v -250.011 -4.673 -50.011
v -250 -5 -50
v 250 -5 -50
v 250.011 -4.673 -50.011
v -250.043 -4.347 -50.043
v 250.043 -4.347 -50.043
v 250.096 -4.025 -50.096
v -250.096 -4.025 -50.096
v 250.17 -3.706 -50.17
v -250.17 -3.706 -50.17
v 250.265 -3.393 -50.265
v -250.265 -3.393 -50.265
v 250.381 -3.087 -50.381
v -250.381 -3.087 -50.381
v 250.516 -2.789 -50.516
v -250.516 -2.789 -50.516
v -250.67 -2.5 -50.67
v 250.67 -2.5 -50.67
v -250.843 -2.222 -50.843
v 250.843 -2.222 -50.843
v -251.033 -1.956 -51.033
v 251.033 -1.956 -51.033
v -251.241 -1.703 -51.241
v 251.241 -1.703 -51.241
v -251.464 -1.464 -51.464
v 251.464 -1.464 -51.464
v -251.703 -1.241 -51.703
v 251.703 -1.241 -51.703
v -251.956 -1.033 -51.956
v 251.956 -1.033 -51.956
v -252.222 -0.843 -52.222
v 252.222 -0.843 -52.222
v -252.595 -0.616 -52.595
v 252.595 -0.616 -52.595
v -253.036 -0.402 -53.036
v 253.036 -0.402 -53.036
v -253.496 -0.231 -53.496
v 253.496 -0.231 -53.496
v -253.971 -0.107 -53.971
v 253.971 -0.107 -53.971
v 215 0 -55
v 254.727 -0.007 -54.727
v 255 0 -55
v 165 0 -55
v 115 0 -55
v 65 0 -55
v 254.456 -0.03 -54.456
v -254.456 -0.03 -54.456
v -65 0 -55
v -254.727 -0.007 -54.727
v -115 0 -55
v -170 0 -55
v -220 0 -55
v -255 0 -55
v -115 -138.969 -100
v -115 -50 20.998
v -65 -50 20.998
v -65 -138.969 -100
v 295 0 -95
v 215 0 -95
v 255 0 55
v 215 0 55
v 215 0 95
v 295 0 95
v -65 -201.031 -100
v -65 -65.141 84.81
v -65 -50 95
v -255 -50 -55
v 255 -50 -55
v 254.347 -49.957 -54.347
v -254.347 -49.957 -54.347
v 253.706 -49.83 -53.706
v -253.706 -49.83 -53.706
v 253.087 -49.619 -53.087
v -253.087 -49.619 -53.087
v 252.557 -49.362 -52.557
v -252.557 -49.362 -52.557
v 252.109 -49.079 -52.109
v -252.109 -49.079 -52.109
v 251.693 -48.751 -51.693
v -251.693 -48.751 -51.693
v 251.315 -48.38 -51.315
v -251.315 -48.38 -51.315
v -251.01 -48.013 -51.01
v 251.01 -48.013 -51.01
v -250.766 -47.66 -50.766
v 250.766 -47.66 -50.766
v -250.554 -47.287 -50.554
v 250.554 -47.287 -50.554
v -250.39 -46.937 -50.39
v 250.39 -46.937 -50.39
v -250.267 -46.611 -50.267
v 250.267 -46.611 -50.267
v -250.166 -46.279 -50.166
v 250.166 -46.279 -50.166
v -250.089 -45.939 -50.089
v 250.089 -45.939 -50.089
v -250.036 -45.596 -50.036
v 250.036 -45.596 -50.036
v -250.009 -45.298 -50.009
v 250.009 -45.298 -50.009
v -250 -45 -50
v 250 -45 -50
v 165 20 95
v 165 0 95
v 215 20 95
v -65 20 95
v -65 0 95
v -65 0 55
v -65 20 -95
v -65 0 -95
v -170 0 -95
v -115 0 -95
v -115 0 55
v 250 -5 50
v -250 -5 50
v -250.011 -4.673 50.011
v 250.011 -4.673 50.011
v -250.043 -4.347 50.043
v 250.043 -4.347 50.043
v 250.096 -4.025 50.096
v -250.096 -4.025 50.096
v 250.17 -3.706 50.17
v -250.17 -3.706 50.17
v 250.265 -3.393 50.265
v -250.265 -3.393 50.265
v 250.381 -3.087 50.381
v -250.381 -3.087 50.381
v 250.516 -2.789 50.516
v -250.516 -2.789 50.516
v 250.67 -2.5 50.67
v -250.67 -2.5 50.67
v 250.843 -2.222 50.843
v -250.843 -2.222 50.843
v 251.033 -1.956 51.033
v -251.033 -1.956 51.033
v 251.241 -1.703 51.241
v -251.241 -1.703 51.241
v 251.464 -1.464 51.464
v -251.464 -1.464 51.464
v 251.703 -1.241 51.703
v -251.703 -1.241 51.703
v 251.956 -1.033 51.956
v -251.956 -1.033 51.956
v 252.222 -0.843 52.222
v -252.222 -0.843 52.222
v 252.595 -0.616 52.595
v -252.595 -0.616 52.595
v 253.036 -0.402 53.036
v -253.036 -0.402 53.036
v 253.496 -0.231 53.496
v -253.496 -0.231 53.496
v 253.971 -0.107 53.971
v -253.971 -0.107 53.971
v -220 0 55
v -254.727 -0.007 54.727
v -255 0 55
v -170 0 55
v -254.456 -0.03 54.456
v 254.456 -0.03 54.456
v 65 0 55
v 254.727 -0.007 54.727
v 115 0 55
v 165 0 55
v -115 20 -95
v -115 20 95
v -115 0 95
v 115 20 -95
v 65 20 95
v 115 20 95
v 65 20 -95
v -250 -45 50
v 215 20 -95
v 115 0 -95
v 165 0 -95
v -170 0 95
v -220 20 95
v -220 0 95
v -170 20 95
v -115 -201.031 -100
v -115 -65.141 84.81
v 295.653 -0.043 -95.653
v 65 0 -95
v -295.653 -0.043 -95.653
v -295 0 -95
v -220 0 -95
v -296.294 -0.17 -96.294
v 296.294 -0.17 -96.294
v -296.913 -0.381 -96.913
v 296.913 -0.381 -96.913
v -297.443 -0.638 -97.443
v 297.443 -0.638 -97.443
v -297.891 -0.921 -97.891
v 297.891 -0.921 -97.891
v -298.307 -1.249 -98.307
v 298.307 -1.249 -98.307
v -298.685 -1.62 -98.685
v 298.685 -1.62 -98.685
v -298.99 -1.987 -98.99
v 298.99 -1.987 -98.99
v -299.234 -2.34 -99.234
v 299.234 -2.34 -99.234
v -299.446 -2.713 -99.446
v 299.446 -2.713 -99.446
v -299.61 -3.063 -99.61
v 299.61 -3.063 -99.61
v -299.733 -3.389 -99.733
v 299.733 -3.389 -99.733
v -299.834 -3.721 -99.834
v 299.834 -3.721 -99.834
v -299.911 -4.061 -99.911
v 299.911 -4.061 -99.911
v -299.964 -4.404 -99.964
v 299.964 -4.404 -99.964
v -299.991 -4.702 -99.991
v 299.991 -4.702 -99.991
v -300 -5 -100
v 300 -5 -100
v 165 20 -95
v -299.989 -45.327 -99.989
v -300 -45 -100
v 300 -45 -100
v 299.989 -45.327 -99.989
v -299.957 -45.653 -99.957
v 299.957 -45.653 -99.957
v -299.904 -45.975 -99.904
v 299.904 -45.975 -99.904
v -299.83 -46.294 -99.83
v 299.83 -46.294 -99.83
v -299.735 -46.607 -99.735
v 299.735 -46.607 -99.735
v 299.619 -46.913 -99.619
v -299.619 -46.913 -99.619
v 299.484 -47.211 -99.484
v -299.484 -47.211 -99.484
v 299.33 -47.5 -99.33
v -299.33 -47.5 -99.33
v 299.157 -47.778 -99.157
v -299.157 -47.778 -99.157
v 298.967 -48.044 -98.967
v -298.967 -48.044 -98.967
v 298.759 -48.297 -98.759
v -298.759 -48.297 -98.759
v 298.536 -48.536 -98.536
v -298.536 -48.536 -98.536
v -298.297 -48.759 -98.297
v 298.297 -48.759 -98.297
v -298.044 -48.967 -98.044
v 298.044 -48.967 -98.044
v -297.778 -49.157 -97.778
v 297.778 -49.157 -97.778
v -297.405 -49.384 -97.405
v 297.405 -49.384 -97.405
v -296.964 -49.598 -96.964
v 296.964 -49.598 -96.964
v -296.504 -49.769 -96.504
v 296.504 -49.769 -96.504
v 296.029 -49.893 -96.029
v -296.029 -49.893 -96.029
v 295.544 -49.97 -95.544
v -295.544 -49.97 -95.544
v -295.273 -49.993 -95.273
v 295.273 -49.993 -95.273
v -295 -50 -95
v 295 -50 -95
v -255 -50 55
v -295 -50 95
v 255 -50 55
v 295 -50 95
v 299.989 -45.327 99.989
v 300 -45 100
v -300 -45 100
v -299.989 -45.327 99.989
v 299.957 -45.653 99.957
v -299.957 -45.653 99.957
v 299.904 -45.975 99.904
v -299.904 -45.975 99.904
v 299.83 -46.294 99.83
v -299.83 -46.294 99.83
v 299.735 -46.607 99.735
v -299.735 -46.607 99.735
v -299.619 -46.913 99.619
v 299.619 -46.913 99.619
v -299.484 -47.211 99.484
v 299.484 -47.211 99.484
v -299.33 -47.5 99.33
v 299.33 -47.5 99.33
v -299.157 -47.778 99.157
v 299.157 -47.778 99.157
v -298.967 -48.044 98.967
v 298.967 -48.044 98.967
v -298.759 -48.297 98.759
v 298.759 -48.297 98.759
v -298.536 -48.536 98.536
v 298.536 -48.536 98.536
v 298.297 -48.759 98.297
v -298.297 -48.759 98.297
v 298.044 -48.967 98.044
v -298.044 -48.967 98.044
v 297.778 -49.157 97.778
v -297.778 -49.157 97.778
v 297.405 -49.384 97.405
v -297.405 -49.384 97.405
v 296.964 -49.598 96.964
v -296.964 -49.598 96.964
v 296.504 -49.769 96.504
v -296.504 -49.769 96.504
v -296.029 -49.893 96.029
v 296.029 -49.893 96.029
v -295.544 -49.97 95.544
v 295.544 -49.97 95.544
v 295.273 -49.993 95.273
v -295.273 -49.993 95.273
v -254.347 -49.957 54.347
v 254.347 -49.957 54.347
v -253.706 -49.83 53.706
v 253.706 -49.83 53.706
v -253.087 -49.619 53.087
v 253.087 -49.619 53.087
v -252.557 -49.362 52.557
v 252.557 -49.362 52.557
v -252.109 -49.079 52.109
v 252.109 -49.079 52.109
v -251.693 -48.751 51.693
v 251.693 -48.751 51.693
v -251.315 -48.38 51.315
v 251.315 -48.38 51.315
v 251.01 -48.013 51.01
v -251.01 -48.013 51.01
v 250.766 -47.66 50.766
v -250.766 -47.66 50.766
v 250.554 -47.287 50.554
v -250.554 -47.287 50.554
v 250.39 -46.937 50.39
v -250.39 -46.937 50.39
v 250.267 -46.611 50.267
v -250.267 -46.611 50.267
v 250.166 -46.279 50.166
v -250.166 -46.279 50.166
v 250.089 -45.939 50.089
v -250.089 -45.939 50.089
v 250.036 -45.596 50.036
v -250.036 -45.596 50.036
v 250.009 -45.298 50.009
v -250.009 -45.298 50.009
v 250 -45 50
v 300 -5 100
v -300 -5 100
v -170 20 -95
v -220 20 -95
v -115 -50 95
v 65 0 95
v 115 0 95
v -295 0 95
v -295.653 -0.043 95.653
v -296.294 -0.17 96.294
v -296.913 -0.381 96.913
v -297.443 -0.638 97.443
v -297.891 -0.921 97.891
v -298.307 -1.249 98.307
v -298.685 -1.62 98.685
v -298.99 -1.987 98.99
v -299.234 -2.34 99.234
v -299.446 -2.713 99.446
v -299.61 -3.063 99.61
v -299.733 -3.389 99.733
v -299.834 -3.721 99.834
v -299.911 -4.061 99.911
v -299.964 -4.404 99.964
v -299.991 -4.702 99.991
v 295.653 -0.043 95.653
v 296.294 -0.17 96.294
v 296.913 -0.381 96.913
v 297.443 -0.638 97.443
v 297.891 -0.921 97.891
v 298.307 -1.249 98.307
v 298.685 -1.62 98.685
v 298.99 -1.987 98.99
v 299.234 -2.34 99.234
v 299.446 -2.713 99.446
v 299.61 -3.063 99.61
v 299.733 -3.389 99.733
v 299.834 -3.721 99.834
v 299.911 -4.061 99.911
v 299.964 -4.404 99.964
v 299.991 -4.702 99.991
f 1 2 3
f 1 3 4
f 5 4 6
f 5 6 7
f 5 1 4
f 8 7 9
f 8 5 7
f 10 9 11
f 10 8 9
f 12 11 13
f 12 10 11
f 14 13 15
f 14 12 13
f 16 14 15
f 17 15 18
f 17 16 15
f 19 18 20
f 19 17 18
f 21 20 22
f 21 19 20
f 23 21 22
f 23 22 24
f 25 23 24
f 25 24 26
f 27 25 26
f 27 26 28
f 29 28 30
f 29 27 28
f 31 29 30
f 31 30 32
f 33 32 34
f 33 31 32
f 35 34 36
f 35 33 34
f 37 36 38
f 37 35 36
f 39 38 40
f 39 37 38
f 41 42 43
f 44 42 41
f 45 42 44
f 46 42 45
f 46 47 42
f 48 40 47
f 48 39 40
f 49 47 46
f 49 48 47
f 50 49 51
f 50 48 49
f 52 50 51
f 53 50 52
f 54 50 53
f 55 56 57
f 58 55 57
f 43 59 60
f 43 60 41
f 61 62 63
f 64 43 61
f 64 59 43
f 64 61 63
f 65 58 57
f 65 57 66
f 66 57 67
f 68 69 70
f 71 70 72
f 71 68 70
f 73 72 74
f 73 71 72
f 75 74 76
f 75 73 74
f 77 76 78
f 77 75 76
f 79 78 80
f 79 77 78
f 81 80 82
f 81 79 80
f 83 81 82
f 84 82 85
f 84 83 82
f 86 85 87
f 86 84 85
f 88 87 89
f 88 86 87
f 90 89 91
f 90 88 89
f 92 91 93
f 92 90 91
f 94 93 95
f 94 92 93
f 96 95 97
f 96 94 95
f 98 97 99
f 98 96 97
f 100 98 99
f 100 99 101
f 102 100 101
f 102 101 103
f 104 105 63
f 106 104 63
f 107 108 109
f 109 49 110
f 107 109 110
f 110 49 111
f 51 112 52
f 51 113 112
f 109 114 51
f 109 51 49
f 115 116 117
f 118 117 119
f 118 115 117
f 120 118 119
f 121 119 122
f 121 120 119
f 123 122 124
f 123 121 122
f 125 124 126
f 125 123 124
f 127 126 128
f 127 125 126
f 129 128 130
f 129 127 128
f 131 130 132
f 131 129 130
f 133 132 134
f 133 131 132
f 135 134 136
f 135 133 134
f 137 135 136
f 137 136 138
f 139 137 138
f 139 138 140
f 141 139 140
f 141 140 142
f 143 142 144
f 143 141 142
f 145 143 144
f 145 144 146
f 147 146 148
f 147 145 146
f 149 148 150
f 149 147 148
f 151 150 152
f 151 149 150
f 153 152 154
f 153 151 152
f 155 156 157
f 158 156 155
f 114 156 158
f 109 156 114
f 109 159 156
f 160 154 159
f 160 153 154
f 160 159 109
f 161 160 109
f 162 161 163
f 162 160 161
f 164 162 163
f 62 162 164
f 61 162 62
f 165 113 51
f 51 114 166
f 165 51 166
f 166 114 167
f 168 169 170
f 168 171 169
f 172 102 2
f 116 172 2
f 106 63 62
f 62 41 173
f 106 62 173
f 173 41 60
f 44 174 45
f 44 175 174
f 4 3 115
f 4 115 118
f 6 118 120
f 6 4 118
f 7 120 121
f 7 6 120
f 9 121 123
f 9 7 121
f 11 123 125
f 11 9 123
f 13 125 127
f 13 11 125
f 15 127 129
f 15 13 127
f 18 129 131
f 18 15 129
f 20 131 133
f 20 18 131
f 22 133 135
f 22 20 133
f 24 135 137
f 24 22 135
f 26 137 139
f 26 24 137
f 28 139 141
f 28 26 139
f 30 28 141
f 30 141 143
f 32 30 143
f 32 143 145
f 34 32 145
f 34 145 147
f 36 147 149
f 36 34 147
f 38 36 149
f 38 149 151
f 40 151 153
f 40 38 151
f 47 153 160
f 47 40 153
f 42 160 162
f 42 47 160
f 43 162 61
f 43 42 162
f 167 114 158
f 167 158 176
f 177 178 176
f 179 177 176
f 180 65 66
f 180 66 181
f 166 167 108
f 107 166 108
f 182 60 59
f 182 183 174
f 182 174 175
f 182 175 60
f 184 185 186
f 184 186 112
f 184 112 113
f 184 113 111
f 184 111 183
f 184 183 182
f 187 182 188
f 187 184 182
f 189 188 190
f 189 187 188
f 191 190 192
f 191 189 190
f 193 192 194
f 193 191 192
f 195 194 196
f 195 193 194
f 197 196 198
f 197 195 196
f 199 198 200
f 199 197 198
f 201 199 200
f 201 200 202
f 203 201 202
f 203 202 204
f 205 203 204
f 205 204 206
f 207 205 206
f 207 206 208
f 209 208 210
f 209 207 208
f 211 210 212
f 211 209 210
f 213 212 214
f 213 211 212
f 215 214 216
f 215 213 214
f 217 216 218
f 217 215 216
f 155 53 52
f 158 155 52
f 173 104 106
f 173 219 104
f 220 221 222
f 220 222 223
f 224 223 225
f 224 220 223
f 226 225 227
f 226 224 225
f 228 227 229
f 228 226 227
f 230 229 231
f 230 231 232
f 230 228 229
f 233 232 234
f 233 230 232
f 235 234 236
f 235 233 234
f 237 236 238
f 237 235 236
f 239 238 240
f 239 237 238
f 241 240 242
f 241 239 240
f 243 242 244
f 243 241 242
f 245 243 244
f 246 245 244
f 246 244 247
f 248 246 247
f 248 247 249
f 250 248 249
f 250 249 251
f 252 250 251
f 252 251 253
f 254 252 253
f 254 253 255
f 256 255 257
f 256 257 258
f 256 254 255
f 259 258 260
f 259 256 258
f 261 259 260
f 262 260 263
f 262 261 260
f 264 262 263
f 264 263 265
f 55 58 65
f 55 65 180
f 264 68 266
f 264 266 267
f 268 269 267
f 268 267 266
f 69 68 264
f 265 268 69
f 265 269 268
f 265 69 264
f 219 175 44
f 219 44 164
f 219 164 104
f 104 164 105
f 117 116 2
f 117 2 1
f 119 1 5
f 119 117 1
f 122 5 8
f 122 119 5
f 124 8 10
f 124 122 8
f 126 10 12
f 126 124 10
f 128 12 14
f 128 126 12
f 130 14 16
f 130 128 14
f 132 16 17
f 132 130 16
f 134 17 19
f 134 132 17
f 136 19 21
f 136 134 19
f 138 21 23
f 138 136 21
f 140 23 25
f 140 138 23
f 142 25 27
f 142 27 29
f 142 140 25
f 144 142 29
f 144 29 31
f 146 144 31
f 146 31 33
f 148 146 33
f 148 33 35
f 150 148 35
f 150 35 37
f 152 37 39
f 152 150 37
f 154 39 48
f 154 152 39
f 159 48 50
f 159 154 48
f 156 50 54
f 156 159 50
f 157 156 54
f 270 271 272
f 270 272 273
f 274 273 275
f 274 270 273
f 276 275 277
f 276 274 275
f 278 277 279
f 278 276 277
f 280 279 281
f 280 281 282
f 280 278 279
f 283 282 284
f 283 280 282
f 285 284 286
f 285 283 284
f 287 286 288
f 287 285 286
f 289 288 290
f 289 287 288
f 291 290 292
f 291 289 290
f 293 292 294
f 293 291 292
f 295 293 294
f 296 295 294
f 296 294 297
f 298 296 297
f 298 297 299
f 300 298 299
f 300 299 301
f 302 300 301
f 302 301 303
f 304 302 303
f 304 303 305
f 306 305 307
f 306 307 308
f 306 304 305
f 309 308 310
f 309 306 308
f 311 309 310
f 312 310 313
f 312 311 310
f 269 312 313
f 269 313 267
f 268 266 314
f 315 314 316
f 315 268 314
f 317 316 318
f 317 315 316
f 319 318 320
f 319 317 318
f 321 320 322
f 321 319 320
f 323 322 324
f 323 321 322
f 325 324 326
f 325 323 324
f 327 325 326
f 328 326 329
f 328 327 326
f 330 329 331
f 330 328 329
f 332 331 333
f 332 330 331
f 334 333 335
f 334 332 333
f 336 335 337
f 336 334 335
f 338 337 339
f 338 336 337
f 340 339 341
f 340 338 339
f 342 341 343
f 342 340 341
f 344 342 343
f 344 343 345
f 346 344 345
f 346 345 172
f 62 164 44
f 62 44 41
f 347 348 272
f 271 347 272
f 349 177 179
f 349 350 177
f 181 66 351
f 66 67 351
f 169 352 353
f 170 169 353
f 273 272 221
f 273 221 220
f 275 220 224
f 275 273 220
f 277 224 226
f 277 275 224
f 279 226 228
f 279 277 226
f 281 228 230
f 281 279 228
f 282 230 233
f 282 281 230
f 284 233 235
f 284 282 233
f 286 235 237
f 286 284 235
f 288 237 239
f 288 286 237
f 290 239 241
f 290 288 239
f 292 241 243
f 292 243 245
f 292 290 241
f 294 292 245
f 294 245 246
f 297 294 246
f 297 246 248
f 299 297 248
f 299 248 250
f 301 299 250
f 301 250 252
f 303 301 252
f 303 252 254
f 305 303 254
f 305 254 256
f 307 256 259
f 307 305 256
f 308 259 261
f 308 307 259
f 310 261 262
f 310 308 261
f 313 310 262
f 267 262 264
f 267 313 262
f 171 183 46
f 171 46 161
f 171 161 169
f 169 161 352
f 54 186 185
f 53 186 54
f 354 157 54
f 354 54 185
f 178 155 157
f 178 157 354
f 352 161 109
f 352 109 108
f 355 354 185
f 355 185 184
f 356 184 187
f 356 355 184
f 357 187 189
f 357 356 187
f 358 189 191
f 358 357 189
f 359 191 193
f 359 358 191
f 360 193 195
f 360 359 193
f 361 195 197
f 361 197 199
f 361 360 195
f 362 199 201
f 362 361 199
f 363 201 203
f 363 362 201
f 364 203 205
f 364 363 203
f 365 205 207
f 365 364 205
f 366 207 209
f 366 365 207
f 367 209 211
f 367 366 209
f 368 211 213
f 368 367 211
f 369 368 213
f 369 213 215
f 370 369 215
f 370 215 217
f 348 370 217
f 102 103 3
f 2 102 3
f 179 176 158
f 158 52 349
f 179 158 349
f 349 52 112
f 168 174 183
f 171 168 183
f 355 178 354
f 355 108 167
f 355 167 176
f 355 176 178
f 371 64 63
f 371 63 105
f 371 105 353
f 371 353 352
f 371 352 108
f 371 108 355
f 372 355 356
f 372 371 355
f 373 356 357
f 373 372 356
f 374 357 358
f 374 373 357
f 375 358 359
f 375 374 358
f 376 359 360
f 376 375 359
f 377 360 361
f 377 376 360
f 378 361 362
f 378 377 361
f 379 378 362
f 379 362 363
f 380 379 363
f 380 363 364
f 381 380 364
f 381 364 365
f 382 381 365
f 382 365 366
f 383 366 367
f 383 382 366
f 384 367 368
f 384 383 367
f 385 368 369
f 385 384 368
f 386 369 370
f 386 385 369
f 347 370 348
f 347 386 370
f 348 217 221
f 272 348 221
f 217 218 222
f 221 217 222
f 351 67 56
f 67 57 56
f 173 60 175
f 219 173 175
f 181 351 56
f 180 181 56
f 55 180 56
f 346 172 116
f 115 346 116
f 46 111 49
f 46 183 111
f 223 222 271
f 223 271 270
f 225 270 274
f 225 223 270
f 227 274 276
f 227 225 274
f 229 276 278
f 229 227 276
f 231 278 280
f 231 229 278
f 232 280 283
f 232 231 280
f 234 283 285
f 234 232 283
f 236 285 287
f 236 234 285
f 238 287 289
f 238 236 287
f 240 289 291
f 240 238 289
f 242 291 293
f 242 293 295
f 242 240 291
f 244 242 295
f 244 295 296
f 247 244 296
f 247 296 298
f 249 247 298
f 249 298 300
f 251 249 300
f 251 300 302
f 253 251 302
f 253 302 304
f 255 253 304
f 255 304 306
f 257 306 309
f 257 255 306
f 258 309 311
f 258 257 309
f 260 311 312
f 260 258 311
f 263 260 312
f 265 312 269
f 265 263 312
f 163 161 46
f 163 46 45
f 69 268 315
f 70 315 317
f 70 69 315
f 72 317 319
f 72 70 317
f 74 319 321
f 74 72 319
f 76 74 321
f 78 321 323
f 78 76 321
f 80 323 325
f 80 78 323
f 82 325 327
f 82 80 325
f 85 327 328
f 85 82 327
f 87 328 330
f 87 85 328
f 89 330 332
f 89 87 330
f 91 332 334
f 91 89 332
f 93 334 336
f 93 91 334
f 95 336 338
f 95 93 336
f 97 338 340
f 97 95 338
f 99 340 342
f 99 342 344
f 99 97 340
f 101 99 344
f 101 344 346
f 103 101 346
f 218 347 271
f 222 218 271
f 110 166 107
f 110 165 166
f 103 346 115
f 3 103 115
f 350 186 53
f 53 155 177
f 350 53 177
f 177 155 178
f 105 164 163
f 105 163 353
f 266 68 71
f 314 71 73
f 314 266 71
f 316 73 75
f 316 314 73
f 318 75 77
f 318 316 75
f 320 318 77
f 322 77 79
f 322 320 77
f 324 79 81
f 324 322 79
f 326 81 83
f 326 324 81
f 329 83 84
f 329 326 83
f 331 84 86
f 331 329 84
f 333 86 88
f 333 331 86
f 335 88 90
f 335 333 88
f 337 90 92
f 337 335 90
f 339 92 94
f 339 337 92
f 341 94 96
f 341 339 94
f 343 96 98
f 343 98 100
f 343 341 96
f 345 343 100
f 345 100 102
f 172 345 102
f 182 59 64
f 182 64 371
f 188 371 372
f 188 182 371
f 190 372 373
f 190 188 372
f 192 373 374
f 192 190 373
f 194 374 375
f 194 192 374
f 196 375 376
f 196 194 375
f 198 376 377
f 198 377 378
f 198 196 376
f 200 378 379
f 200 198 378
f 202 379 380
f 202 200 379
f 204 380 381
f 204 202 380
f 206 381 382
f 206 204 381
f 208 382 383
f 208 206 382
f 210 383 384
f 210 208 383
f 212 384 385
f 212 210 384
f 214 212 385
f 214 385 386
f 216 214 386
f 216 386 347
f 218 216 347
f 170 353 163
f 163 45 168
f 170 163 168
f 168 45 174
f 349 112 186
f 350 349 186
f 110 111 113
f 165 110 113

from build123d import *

# Parameters (mm, degrees)
SKETCH5_W           = 50.00000000000001
SKETCH5_H           = 50
SKETCH10_W          = 846.4866201904617
SKETCH10_H          = 361.1409219051918
CUT_EXTRUDE1_DEPTH  = 402.55848422828825
SKETCH12_W          = 1370.912564730276
SKETCH12_H          = 1025.6443891593005
CUT_EXTRUDE2_DEPTH  = 435.26163944528145
BOSS_EXTRUDE1_DEPTH = 20


with BuildPart() as part:
    # Sweep1: sweep along a path in Sketch1
    with BuildLine(Plane(origin=(0, 0, 0), x_dir=(1, 0, 0), z_dir=(0, 1, 0))) as sweep1_path:
        Line((-299.99999999999994, -99.99999999999997), (300.00000000000006, -99.99999999999997))
        Line((300.00000000000006, -99.99999999999997), (300.00000000000006, 100.00000000000003))
        Line((300.00000000000006, 100.00000000000003), (-299.99999999999994, 100.00000000000003))
        Line((-299.99999999999994, 100.00000000000003), (-299.99999999999994, -99.99999999999997))
    # Sketch2 → Sweep1 (sweep)
    with BuildSketch(Plane(origin=(0, 0, 0), x_dir=(0, 0, -1), z_dir=(1, 0, 0))):
        with BuildLine():
            Line((-94.99999999999994, 0), (-55.00000000000001, 0))
            ThreePointArc((-55.00000000000001, 0), (-51.464466094067234, -1.4644660940672622), (-49.99999999999997, -5.000000000000035))
            Line((-49.99999999999997, -5.000000000000035), (-49.99999999999997, -44.99999999999997))
            ThreePointArc((-49.99999999999997, -44.99999999999997), (-51.464466094067234, -48.535533905932745), (-55.00000000000001, -50))
            Line((-55.00000000000001, -50), (-94.99999999999994, -50))
            ThreePointArc((-94.99999999999994, -50), (-98.53553390593271, -48.53553390593274), (-99.99999999999997, -44.99999999999997))
            Line((-99.99999999999997, -44.99999999999997), (-99.99999999999997, -5.0000000000000355))
            ThreePointArc((-99.99999999999997, -5.0000000000000355), (-98.53553390593271, -1.4644660940672654), (-94.99999999999994, 0))
        make_face()
    sweep(path=sweep1_path.line, transition=Transition.RIGHT)

    # Sketch13 → Boss-Extrude1 (add)
    with BuildSketch(Plane(origin=(0, 0, 0), x_dir=(1, 0, 0), z_dir=(0, 1, 0))):
        Polygon((-219.99999999999991, -94.99999999999991), (-169.99999999999994, -94.99999999999991), (-169.99999999999994, 94.99999999999993), (-219.99999999999991, 94.99999999999994), align=None)
        Polygon((-114.99999999999989, -94.99999999999991), (-64.99999999999991, -94.99999999999991), (-64.99999999999989, 94.99999999999993), (-114.9999999999999, 94.99999999999999), align=None)
        Polygon((64.99999999999997, -94.99999999999994), (114.99999999999997, -94.99999999999994), (114.99999999999997, 94.99999999999994), (64.99999999999997, 94.99999999999993), align=None)
        Polygon((164.99999999999997, -94.99999999999994), (214.99999999999997, -94.99999999999994), (214.99999999999997, 94.99999999999993), (164.99999999999997, 94.99999999999994), align=None)
    extrude(amount=BOSS_EXTRUDE1_DEPTH)


with BuildPart() as body_2:
    # Sweep3: sweep along a path in Sketch3
    with BuildLine(Plane.ZY.offset(89.99999999999994)) as sweep3_path:
        Line((69.99999999999999, -44.99999999999994), (-170.5817313387843, -221.8983318667533))
    # Sketch5 → Sweep3 (sweep)
    with BuildSketch(Plane(origin=(-89.99999999999994, -44.999999999999964, 70), x_dir=(-1, 0, 0), z_dir=(0, -0.5923904504775186, -0.8056510126494241))):
        Rectangle(SKETCH5_W, SKETCH5_H)
    sweep(path=sweep3_path.line)

    # Sketch10 → Cut-Extrude1 (cut, through all)
    with BuildSketch(Plane.XZ.offset(50)):
        Rectangle(SKETCH10_W, SKETCH10_H)
    extrude(amount=-CUT_EXTRUDE1_DEPTH, mode=Mode.SUBTRACT)

    # Sketch11 → section 1 of loft1
    with BuildSketch(Plane.XZ.offset(50), mode=Mode.PRIVATE) as loft1_s1:
        with BuildLine():
            Line((-114.99999999999993, 73.67647058823533), (-114.99999999999993, 94.99999999999991))
            Line((-114.99999999999993, 94.99999999999991), (-64.99999999999994, 94.99999999999991))
            Line((-64.99999999999994, 94.99999999999991), (-64.99999999999994, 73.67647058823533))
            Line((-64.99999999999994, 73.67647058823533), (-114.99999999999993, 73.67647058823533))
        make_face()
    # loft from a face of the part (loft1)
    loft([body_2.faces().sort_by_distance((-89.99999999999993, -57.57063765811777, 79.24311592508671))[0], loft1_s1.sketch])

    # Sketch12 → Cut-Extrude2 (cut, through all)
    with BuildSketch(Plane(origin=(0, 0, -100), x_dir=(-1, 0, 0), z_dir=(0, 0, -1))):
        Rectangle(SKETCH12_W, SKETCH12_H)
    extrude(amount=CUT_EXTRUDE2_DEPTH, mode=Mode.SUBTRACT)


solid = Compound([part.part, body_2.part])
